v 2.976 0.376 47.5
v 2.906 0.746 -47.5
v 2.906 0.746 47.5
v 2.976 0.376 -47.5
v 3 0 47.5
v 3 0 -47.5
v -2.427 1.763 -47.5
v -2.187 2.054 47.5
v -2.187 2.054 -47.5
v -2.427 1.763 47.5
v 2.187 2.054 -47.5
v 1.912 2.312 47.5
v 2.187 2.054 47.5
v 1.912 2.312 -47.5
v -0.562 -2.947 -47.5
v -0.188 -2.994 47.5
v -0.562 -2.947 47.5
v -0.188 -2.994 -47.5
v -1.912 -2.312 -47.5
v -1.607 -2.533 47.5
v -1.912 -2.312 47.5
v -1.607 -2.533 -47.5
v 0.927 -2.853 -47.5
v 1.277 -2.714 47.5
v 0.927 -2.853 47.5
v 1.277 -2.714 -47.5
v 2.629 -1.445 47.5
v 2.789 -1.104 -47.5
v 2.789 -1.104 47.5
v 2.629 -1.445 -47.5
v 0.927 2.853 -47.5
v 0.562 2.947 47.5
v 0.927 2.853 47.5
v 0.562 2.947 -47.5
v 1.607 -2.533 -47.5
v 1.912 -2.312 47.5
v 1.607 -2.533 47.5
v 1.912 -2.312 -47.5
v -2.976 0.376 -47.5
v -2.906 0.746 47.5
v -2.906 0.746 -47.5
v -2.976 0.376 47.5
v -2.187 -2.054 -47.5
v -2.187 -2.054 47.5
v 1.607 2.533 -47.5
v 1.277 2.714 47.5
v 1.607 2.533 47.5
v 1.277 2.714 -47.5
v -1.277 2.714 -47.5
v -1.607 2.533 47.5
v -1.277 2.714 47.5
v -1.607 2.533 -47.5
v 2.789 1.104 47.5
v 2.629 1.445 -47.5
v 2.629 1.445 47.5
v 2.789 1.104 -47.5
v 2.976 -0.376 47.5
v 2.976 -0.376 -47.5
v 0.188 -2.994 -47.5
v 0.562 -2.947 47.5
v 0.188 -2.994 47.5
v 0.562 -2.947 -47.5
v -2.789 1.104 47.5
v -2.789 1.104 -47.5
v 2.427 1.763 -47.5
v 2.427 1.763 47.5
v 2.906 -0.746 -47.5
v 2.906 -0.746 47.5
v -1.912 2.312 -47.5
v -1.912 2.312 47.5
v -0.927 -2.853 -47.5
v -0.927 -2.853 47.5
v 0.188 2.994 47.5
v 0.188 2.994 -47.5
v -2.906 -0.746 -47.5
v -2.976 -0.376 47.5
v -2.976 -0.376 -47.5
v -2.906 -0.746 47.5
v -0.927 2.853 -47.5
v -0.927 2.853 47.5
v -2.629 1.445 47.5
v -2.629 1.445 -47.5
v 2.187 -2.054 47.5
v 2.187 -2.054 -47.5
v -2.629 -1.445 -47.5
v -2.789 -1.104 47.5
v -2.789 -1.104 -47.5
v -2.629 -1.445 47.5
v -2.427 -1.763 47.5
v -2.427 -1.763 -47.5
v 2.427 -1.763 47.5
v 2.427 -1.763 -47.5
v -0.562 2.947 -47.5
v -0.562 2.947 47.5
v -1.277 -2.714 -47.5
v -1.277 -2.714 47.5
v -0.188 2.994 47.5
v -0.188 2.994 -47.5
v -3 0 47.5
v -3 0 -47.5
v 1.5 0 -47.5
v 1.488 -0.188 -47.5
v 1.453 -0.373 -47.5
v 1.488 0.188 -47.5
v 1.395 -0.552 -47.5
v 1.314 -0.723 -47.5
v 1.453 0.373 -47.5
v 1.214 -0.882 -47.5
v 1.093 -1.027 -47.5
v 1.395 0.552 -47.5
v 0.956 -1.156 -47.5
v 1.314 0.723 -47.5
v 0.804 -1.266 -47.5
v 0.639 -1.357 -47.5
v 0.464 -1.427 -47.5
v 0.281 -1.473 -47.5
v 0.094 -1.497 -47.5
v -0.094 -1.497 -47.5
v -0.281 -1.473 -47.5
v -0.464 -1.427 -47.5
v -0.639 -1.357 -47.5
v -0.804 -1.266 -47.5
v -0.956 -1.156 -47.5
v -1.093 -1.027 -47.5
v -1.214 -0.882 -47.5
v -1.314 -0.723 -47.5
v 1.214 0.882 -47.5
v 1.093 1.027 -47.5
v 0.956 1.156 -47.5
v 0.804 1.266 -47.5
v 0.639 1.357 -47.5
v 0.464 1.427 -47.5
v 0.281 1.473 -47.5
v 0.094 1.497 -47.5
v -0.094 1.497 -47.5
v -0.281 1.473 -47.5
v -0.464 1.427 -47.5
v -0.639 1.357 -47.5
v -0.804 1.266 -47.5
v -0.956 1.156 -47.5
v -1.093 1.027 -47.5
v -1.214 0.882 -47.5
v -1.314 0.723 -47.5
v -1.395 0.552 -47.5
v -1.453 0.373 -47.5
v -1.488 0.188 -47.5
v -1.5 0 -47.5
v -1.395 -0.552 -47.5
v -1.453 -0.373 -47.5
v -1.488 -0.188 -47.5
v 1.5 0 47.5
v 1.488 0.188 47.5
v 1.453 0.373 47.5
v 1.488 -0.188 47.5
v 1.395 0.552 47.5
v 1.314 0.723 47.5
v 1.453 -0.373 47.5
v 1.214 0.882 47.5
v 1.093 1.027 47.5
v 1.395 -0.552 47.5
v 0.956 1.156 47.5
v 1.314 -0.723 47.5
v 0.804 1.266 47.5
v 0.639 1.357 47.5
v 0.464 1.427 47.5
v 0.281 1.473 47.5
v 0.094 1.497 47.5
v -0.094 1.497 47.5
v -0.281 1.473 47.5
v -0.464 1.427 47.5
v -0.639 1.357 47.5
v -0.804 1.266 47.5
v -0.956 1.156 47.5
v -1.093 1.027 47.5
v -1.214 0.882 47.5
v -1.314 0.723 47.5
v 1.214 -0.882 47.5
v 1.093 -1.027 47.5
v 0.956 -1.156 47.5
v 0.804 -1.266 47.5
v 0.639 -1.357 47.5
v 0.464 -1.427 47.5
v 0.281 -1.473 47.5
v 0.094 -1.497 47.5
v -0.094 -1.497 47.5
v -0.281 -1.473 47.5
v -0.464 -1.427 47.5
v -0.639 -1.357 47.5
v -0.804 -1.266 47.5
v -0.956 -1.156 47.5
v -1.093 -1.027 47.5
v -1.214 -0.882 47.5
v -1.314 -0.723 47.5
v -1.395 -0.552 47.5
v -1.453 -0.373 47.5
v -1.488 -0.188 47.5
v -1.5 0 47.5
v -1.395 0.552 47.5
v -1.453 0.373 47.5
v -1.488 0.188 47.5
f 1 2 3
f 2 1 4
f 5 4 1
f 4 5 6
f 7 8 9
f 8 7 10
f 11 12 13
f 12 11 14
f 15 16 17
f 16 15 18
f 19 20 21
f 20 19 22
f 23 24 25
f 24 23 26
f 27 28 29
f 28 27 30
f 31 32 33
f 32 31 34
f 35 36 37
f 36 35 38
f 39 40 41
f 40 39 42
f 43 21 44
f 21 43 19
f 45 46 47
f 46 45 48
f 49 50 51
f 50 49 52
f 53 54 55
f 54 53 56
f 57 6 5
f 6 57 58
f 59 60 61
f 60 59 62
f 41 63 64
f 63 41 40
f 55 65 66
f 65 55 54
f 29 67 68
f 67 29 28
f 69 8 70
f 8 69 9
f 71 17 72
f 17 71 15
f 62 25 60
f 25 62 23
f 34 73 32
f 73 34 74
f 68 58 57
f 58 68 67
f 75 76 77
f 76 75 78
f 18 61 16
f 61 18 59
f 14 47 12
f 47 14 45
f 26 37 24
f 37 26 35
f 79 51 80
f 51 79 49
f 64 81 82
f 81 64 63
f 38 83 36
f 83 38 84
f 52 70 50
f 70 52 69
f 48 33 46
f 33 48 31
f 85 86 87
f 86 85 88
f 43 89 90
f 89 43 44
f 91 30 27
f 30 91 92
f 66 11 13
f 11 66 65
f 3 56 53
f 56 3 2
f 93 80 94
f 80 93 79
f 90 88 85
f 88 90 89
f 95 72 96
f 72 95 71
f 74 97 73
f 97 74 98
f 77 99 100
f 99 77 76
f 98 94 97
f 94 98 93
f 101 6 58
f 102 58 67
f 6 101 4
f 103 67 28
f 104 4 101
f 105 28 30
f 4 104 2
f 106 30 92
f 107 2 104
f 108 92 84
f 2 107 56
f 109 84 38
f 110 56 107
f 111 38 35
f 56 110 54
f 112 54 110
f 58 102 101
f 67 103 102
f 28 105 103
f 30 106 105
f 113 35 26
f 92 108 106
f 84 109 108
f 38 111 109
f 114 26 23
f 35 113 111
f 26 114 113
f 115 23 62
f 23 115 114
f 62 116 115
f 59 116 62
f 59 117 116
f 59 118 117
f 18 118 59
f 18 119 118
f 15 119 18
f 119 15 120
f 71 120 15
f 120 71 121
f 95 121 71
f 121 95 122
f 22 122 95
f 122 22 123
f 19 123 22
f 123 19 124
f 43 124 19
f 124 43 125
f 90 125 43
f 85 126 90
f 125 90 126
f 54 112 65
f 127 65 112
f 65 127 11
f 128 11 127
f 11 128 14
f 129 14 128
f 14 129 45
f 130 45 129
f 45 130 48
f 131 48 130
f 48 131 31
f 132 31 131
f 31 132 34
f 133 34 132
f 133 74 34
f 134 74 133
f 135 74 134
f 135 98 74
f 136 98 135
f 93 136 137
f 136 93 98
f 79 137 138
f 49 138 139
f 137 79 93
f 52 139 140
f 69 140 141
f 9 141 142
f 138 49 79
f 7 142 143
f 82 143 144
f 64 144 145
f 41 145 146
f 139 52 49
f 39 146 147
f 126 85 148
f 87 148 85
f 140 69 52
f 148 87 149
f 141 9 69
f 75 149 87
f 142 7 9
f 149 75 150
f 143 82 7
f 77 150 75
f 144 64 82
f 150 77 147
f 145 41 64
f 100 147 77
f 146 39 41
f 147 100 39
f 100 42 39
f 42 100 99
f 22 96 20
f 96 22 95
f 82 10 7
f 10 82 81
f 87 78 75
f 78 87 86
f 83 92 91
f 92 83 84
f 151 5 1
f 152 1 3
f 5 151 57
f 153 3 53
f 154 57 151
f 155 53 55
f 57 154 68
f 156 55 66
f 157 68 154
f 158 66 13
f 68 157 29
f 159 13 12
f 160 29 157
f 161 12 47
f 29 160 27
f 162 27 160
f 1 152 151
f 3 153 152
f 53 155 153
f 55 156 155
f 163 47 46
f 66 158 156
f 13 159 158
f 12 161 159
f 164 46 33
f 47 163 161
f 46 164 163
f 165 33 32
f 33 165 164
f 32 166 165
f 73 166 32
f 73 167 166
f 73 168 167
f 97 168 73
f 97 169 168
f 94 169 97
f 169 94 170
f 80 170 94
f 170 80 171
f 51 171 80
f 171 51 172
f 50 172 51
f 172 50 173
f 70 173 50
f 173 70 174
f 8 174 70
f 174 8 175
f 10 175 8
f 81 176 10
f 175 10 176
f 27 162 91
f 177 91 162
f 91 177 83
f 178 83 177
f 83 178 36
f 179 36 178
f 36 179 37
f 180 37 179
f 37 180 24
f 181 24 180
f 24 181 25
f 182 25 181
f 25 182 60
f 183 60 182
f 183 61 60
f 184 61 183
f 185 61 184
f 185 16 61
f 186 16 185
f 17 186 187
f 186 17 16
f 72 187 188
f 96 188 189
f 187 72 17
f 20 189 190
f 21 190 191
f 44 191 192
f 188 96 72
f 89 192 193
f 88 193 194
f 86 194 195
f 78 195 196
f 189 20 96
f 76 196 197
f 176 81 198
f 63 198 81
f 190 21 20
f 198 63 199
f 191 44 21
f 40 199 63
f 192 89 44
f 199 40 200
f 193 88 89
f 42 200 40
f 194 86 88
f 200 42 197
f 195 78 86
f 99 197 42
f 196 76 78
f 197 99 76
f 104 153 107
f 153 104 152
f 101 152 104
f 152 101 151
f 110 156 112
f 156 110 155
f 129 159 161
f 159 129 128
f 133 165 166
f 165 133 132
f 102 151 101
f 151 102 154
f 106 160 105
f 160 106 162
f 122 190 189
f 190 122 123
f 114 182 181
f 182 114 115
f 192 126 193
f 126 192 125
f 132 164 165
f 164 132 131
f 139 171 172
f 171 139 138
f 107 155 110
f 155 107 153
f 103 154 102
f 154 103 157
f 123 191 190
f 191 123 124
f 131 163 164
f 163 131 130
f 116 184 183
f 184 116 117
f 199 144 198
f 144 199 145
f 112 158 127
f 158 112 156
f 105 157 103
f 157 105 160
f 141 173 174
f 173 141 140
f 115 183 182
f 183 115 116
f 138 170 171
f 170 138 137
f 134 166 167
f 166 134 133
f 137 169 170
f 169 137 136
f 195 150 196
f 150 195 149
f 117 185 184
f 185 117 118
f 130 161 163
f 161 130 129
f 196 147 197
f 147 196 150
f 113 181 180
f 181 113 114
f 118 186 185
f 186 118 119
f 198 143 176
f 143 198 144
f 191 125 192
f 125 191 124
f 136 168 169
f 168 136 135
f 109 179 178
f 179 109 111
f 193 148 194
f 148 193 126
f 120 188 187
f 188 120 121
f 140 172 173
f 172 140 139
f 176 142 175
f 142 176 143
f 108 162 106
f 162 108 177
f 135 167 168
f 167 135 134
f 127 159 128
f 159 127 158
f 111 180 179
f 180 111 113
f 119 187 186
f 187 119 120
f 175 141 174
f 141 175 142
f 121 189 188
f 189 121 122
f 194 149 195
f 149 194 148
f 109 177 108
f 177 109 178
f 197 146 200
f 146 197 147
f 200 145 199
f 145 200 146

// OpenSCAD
$fn = 50;


difference() {
	union() {
		translate(v = [0, 0, -47.5000000000]) {
			cylinder(h = 95, r = 3.0000000000);
		}
	}
	union() {
		translate(v = [0, 0, -100.0000000000]) {
			cylinder(h = 200, r = 1.5000000000);
		}
	}
}
